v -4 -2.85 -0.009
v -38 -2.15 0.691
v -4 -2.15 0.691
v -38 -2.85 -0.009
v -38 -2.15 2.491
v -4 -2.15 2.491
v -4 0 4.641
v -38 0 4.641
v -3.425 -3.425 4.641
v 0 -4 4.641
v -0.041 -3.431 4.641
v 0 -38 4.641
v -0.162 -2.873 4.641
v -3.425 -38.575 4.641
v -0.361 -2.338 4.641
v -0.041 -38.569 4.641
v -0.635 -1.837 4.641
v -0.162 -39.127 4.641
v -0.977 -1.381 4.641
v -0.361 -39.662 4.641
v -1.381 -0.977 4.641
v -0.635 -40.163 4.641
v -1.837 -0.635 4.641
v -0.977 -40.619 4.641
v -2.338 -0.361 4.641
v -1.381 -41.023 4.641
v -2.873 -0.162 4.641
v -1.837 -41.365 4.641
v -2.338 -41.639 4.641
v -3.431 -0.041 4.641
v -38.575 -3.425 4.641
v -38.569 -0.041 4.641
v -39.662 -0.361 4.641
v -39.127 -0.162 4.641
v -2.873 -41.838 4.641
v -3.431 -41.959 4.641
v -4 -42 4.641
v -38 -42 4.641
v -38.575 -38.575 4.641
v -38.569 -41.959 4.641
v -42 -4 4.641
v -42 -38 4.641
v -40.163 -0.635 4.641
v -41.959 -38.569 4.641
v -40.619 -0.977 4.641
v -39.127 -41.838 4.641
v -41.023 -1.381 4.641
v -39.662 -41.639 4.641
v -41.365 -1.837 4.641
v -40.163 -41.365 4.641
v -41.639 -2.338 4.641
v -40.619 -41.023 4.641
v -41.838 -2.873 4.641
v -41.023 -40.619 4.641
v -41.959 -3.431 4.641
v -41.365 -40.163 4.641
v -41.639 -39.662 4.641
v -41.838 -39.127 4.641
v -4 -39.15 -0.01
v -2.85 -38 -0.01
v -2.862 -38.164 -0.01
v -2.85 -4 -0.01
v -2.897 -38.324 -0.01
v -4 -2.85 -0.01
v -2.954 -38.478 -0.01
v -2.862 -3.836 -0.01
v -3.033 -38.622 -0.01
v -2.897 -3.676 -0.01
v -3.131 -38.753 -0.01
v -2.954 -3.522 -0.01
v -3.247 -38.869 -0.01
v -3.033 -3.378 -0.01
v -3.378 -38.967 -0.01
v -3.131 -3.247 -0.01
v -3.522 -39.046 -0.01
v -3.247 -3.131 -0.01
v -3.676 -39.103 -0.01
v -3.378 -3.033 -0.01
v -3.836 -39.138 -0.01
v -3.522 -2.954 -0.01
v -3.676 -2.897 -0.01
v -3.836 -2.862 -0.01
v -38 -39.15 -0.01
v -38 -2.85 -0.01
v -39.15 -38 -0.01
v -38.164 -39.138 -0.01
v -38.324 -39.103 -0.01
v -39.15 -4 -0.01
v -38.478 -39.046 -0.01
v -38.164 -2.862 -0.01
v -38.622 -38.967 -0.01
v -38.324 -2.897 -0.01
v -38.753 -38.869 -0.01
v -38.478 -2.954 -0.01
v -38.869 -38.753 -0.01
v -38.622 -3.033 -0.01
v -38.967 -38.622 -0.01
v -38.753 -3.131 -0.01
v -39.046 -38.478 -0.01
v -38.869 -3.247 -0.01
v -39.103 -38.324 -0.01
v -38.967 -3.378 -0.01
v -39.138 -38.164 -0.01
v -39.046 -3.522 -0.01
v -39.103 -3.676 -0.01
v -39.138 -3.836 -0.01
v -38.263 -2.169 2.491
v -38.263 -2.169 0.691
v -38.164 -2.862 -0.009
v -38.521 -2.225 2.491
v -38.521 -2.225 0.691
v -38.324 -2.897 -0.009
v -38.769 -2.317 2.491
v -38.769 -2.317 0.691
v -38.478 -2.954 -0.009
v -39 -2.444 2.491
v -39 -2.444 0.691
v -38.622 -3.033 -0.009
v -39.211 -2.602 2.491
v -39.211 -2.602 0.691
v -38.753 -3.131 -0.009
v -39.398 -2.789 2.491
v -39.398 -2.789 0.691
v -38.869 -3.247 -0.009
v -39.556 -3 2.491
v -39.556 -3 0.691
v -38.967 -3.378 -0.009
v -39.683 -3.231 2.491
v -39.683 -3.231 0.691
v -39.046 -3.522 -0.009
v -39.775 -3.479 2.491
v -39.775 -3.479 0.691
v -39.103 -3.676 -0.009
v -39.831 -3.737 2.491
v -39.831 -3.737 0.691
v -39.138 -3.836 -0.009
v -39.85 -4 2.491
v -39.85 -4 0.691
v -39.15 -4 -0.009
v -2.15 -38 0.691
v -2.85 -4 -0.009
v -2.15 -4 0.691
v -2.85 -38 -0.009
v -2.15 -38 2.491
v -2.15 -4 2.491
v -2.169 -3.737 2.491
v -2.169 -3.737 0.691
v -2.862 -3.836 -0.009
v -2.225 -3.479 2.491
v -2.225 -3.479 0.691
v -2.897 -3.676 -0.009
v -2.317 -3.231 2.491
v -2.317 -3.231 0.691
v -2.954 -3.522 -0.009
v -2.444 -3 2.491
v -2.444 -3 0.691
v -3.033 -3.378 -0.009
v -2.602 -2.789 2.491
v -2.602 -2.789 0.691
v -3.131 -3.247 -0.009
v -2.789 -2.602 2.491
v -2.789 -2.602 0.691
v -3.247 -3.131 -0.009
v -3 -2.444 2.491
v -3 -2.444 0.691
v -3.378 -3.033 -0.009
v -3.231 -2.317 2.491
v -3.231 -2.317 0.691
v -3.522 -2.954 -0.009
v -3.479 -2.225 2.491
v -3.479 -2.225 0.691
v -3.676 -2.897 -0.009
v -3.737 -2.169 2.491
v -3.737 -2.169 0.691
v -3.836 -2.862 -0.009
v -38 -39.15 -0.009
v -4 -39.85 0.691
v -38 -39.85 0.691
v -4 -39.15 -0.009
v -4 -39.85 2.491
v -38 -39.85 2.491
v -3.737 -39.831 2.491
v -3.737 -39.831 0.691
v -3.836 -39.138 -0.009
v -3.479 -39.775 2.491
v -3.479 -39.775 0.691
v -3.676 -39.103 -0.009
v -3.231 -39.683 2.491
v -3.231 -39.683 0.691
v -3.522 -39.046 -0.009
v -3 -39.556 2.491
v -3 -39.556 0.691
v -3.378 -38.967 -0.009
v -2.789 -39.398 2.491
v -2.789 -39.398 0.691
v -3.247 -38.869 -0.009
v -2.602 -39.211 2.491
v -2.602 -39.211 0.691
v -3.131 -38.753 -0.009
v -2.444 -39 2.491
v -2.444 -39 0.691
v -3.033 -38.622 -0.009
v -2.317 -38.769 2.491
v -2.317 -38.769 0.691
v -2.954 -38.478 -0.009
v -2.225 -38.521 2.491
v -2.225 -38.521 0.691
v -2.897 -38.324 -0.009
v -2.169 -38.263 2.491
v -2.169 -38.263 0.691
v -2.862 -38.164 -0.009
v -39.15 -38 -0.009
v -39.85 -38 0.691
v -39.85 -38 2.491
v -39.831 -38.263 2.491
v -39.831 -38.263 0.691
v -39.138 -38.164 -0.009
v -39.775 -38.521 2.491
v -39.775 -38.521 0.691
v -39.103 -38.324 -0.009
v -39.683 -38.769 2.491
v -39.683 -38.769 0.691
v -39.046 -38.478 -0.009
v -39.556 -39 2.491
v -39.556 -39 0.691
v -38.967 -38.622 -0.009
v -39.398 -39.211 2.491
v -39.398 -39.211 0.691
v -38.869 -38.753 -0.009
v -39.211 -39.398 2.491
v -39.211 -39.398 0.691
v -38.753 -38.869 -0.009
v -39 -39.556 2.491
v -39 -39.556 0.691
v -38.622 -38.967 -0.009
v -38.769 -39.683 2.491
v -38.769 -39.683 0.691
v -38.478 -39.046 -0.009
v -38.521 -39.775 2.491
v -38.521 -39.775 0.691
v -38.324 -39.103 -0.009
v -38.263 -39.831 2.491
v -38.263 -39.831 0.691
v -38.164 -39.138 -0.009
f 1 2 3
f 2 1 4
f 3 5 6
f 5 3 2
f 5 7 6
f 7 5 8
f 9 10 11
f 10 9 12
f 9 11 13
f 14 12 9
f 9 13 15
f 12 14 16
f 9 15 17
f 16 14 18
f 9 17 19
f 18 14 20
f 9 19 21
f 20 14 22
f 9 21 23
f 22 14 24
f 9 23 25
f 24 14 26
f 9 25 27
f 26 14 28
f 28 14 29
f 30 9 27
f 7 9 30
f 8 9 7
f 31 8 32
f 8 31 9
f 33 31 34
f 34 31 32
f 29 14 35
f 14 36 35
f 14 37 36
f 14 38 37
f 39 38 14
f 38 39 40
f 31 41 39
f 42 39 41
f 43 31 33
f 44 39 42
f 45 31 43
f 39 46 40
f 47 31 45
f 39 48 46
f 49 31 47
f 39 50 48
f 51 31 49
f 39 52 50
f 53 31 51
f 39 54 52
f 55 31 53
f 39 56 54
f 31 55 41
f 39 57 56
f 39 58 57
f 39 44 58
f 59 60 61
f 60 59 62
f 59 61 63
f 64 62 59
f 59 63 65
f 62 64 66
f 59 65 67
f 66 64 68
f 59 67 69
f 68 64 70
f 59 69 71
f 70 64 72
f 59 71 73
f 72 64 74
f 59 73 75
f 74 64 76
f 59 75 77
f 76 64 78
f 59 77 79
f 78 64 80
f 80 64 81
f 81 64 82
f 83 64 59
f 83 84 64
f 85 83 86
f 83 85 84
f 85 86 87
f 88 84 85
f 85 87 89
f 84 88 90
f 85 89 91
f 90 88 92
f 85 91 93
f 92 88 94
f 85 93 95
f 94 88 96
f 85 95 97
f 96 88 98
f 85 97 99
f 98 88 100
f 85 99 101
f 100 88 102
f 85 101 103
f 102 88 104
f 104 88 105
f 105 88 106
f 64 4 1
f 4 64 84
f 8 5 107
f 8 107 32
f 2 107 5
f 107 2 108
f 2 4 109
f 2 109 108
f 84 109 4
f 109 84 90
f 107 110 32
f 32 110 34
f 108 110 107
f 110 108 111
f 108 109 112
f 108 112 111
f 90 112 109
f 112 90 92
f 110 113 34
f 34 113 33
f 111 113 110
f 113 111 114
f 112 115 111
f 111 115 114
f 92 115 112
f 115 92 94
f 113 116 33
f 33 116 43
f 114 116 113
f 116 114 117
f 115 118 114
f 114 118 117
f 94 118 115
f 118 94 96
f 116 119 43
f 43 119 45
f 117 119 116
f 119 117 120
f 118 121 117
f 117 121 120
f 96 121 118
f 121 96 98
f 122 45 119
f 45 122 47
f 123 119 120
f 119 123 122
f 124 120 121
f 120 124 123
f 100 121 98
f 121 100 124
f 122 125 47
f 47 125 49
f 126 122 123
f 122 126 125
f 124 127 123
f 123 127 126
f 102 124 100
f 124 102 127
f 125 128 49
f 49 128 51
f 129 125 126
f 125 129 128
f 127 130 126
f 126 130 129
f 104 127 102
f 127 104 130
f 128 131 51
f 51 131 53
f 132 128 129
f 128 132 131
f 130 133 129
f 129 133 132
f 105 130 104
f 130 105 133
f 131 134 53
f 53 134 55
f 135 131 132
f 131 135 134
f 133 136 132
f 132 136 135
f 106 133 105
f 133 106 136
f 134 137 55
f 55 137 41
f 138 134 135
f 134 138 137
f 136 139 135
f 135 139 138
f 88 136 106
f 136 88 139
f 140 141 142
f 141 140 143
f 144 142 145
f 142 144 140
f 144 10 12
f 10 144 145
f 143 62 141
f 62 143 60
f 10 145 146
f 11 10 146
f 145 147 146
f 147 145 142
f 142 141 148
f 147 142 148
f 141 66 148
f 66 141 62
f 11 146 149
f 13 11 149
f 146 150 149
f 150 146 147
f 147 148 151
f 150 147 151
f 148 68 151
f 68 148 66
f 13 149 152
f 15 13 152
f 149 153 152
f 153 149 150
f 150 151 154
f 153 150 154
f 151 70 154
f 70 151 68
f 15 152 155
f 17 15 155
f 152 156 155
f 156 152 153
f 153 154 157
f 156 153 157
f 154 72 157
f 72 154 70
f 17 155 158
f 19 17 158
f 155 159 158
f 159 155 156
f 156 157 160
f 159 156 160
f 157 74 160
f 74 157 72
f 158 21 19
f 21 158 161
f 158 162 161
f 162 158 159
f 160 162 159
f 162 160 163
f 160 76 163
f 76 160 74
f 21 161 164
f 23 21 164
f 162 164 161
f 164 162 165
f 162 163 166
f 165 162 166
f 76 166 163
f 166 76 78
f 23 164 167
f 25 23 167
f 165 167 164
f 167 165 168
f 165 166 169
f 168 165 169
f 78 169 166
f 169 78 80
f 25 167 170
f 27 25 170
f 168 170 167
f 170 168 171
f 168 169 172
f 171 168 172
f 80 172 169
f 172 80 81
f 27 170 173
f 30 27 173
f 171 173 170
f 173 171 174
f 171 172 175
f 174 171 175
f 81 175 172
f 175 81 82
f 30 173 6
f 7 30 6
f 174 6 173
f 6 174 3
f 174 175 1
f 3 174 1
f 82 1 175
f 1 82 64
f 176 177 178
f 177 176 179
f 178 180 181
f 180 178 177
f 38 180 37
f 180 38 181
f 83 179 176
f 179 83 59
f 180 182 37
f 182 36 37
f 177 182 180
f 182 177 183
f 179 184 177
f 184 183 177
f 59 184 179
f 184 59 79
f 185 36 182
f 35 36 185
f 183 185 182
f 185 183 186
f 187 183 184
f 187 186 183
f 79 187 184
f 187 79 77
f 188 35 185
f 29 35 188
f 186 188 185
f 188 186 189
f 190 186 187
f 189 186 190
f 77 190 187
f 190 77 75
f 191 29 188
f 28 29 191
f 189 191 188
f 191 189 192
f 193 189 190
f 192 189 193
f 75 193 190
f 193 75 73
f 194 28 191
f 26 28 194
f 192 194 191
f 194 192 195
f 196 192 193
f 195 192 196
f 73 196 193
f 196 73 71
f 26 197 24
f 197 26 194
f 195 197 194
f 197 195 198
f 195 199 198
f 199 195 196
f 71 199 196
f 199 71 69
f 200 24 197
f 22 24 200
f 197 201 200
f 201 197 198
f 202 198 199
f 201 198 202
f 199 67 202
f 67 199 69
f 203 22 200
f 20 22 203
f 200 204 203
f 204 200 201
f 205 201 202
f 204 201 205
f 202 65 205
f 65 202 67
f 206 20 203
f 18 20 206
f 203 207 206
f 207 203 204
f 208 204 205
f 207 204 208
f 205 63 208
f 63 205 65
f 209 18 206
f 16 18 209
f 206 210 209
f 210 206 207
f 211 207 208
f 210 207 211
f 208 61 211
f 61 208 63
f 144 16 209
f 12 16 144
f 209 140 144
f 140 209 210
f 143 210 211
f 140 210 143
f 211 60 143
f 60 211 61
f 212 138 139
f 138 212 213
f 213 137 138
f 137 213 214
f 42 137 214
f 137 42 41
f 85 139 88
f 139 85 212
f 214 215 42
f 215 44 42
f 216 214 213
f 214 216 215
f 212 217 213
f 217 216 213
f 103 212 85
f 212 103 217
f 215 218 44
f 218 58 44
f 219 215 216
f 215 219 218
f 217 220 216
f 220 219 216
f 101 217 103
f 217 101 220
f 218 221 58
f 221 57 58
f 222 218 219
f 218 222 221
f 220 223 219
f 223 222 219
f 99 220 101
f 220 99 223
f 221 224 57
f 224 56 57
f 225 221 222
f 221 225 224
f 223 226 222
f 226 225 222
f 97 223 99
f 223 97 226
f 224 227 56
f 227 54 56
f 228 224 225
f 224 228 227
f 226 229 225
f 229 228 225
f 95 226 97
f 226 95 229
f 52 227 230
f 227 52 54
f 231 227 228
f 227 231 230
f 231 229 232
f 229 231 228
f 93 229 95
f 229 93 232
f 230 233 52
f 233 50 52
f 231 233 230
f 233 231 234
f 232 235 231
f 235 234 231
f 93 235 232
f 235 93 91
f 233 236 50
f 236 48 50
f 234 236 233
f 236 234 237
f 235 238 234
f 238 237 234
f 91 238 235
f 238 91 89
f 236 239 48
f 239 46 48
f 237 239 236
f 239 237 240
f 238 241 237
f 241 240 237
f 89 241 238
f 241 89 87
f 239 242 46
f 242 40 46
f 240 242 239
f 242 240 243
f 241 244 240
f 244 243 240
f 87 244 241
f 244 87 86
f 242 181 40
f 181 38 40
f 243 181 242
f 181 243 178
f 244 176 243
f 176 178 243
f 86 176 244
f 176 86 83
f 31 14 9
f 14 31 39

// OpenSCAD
// ===== INFORMATION ===== //
/*
 IMPORTANT: rendering will be better in development builds and not the official release of OpenSCAD, but it makes rendering only take a couple seconds, even for comically large bins.

https://github.com/kennetek/gridfinity-rebuilt-openscad

STANDALONE VERSION - All dependencies inlined
*/

// ===== INLINED DEPENDENCIES ===== //

// ==== BEGIN: src/core/standard.scad ====

// minimum wall thickness
d_wall = 0.95;

// internal fillet radius
r_f2 = 2.8;

// width of divider between compartments
d_div = 1.2;

/**
 * @brief Size of a single gridfinity unit. [Length, Width] In millimeters.
 */
GRID_DIMENSIONS_MM = [42, 42];

// Tollerance to make sure cuts don't leave a sliver behind,
// and that items are properly connected to each other.
TOLLERANCE = 0.02;

// ****************************************
// Magnet / Screw Hole Constants
// ****************************************
LAYER_HEIGHT = 0.2;
MAGNET_HEIGHT = 2;

SCREW_HOLE_RADIUS = 3 / 2;
MAGNET_HOLE_RADIUS = 6.5 / 2;
MAGNET_HOLE_DEPTH = MAGNET_HEIGHT + (LAYER_HEIGHT * 2);

// distance of hole from side of bin
d_hole_from_side=8;

// Based on https://gridfinity.xyz/specification/
HOLE_DISTANCE_FROM_BOTTOM_EDGE = 4.8;

// Meassured diameter in Fusion360.
// Smaller than the magnet to keep it squeezed.
REFINED_HOLE_RADIUS = 5.86 / 2;
REFINED_HOLE_HEIGHT = MAGNET_HEIGHT - 0.1;
// How many layers are between a Gridfinity Refined Hole and the bottom
REFINED_HOLE_BOTTOM_LAYERS = 2;

// Experimentally chosen for a press fit.
MAGNET_HOLE_CRUSH_RIB_INNER_RADIUS = 5.9 / 2;
// Mostly arbitrarily chosen.
// 30 ribs does not print with a 0.4mm nozzle.
// Anything 5 or under produces a hole that is not round.
MAGNET_HOLE_CRUSH_RIB_COUNT = 8;

// Radius to add when chamfering magnet and screw holes.
CHAMFER_ADDITIONAL_RADIUS = 0.8;
CHAMFER_ANGLE = 45;

// When countersinking the baseplate, how much to add to the screw radius.
BASEPLATE_SCREW_COUNTERSINK_ADDITIONAL_RADIUS = 5/2;
BASEPLATE_SCREW_COUNTERBORE_RADIUS = 5.5/2;
BASEPLATE_SCREW_COUNTERBORE_HEIGHT = 3;

// ****************************************
// Tab Constants
// Arbitrarily chosen.
// ****************************************

/**
 * @brief Maximum width of a tab.
 */
TAB_WIDTH_NOMINAL = 42;

 /**
 * @brief How deep the tab protrudes into the bin.
 * @details External code should use `TAB_SIZE.x` instead.
 */
_tab_depth = 15.85;

/**
 * @brief Angle of the support holding up the tab
 */
 _tab_support_angle = 36;

 /**
 * @brief Additional support height, so the end isn't a sharp angle.
 */
 _tab_support_height = 1.2;

_tab_height = tan(_tab_support_angle) * _tab_depth + _tab_support_height;
TAB_POLYGON = [
    [0, 0], // Start
    [0, _tab_height], // Up
    [_tab_depth, _tab_height], //Out
    [_tab_depth, _tab_height - _tab_support_height] // Prevent a sharp angle
    //Implicit back to start
];

/**
 * @brief Size of the tab.
 * @Details "x": How deep the tab protrudes into the bin.
 *          "y": The height of the tab.
 */
TAB_SIZE = TAB_POLYGON[2];

// ****************************************
// Stacking Lip Constants
// Based on https://gridfinity.xyz/specification/
// Also includes a support base.
// ****************************************

/**
 * @Summary Fillet so the stacking lip does not come to a sharp point.
 */
STACKING_LIP_FILLET_RADIUS = 0.6;

/**
 * @Summary Height of the innermost section. In mm.
 * @Details Used to keep the innermost lip from just being a triangle.
 *          Spec implicitly expects wall width to equal stacking lip depth, so does not define this.
 */
STACKING_LIP_SUPPORT_HEIGHT = 1.2;

/**
 * @Summary Stacking lip as defined in the spec.  No support.
 * @Details This is just a line, and will not create a solid polygon.
 */
STACKING_LIP_LINE = [
    [0, 0], // Inner tip
    [0.7, 0.7], // Go out 45 degrees
    [0.7, (0.7+1.8)], // Vertical increase
    [(0.7+1.9), (0.7+1.8+1.9)], // Go out 45 degrees
];

/**
 * @Summary Size of the stacking lip.
 * @Details "x": How deep the stacking lip protrudes into the bin.
 *               Including wall thickness.
 *          "y": The height of the stacking lip.
 * @WARNING: Height does NOT include STACKING_LIP_SUPPORT_HEIGHT.
 */
STACKING_LIP_SIZE = STACKING_LIP_LINE[3];

/**
 * @brief Height of the stacking lip.
 * @details Height does **not** include STACKING_LIP_SUPPORT_HEIGHT.
 */
STACKING_LIP_HEIGHT = STACKING_LIP_SIZE.y;

_stacking_lip_support_angle = 45;

/**
 * @Summary Calculated value for the overall height of the stacking lip.
 *          Including support.
 */
_stacking_lip_support_height_mm =
    STACKING_LIP_SUPPORT_HEIGHT
    + tan(90 - _stacking_lip_support_angle) * STACKING_LIP_SIZE.x;

/**
 * @Summary Stacking lip with a support. Used to create a polygon.
 * @Details Support is so the stacking lip is not floating in mid air when wall width is less than stacking lip depth.
 */
STACKING_LIP = concat(STACKING_LIP_LINE, [
    [STACKING_LIP_SIZE.x-TOLLERANCE, -_stacking_lip_support_height_mm], // Down to support bottom
    [0, -STACKING_LIP_SUPPORT_HEIGHT], // Up and in (to bottom inner support)
    //[0, 0] // Implicit back to start
]);

// ****************************************
// Base constants
// Based on https://gridfinity.xyz/specification/
// ****************************************

/**
 * @Summary Profile of a Gridfinity base as described in the spec.
 * @Details This is just a line, and will not create a solid polygon.
 */
BASE_PROFILE = [
    [0, 0], // Innermost bottom point
    [0.8, 0.8], // Up and out at a 45 degree angle
    [0.8, (0.8+1.8)], // Straight up
    [(0.8+2.15), (0.8+1.8+2.15)] // Up and out at a 45 degree angle
];

/**
 * @brief Maximum [x, y] values/size of the base.
 */
_base_profile_max_mm= BASE_PROFILE[3];

/**
 * @Summary Corner radius of the top of the base.
 */
BASE_TOP_RADIUS = 7.5 / 2;

/**
 * @Summary Size of the top of the base. [Length, Width]
 * @Details Each unit's base is 41.5mm x 41.5mm
 *          Leaving 0.5mm gap with an l_grid of 42
 */
BASE_TOP_DIMENSIONS = [41.5, 41.5];

/**
 * @Summary How much overhang is expected by the standard per base.
 * @Details There should be a 0.5mm gap between each base.
 *          This must be kept constant, even at half/quarter grid sizes.
 *          Otherwise, they won't fit in normal grids.
 */
BASE_GAP_MM = GRID_DIMENSIONS_MM - BASE_TOP_DIMENSIONS;

/**
 * @brief Height of the base profile.
 * @details Does **not** include the structure tying the bases together.
 */
BASE_PROFILE_HEIGHT = _base_profile_max_mm.y;

/**
 * @Summary Height of the base.
 * @details Includes the structure tying the bases together.
 */
BASE_HEIGHT = 7;

/**
 * @Summary Height of the structure tying the bases together.
 */
BASE_BRIDGE_HEIGHT = BASE_HEIGHT - BASE_PROFILE_HEIGHT;

/**
 * @Summary Corner radius of the bottom of the base.
 * @Details This is also how much BASE_PROFILE needs to be translated
 *          to use `sweep_rounded(...)`.
 */
BASE_BOTTOM_RADIUS = BASE_TOP_RADIUS - _base_profile_max_mm.x;

/**
 * @Summary Dimensions of the bottom of the base. [Length, Width]
 * @Details Supports arbitrary top sizes.
 * @param top_dimensions [Length, Width] of the top of the base.
 */
function base_bottom_dimensions(top_dimensions = BASE_TOP_DIMENSIONS) =
    assert(is_list(top_dimensions) && len(top_dimensions) == 2
        && is_num(top_dimensions.x) && is_num(top_dimensions.y))
    top_dimensions
    - 2*[_base_profile_max_mm.x, _base_profile_max_mm.x];

// ***************
// Gridfinity Refined Thumbscrew
// See https://www.printables.com/model/413761-gridfinity-refined
// ***************

BASE_THUMBSCREW_OUTER_DIAMETER=15;
BASE_THUMBSCREW_PITCH=1.5;


// ****************************************
// Weighted Baseplate
// ****************************************

// Baseplate bottom part height (part added with weigthed=true)
bp_h_bot = 6.4;
// Baseplate bottom cutout rectangle size
bp_cut_size = 21.4;
// Baseplate bottom cutout rectangle depth
bp_cut_depth = 4;
// Baseplate bottom cutout rounded thingy width
bp_rcut_width = 8.5;
// Baseplate bottom cutout rounded thingy left
bp_rcut_length = 4.25;
// Baseplate bottom cutout rounded thingy depth
bp_rcut_depth = 2;

// ****************************************

// radius of cutout for skeletonized baseplate
r_skel = 2;
// minimum baseplate thickness (when skeletonized)
h_skel = 1;


// ****************************************
// Deprecated Values
// Will be removed / re-named in the future.
// ****************************************

// height of tab (yaxis, measured from inner wall)
d_tabh = _tab_depth;

// angle of tab
a_tab = _tab_support_angle;

/**
 * @deprecated Use GRID_DIMENSIONS_MM instead.
 */
l_grid = GRID_DIMENSIONS_MM.x;

// ==== END: src/core/standard.scad ====

// ==== BEGIN: helper functions (angles, generic-helpers, shapes) ====

/**
 * @brief `sign` function, but 0 means a positive sign.
 * @description This is useful for applying signs to trig functions.
 * @returns -1 or 1.
 */
function signp(number) =
    assert(is_num(number))
    let(n = sign(number))
    n == 0 ? 1 : n;

/*
 * @brief Convert an angle to between -180 and +180 degrees.
 */
function normalize_angle(angle) =
    assert(is_num(angle))
    let(a = angle%360)
    a > 180 ? a - 360 :
    a < -180 ? a + 360 : a;

/*
 * @brief Convert an angle to between 0 and +360 degrees.
 */
function positive_angle(angle) =
    assert(is_num(angle))
    let(a = angle%360)
    a < 0 ? (a + 360) % 360 : a;

/**
 * @brief Determines the number of fragments in a circle. Aka, Circle resolution.
 * @param r Radius of the circle.
 * @details Recommended function from the manual as a translation of the OpenSCAD function.
 *          Used to improve performance by not rendering every single degree of circles/spheres.
 * @see https://en.wikibooks.org/wiki/OpenSCAD_User_Manual/Other_Language_Features#Circle_resolution:_$fa,_$fs,_and_$fn
 */
function get_fragments_from_r(r) =
    assert(r > 0)
    ($fn>0?($fn>=3?$fn:3):ceil(max(min(360/$fa,r*2*PI/$fs),5)));

function clp(x,a,b) = min(max(x,a),b);
function is_even(number) = (number%2)==0;

module copy_mirror(vec=[0,1,0]) {
    children();
    if (vec != [0,0,0])
    mirror(vec)
    children();
}

module pattern_circular(n=2) {
    for (i = [1:n])
    rotate(i*360/n)
    children();
}

/**
 * @brief Unity (no change) affine transformation matrix.
 * @details For use with multmatrix transforms.
 */
unity_matrix = [
    [1, 0, 0, 0],
    [0, 1, 0, 0],
    [0, 0, 1, 0],
    [0, 0, 0, 1]
];

/**
 * @brief Convert a vector into a unit vector.
 * @returns The unit vector.  Where total magnitude is 1.
 */
function vector_as_unit(vector) = vector / norm(vector);

function _affine_rotate_x(angle_x) = [
    [1,  0, 0, 0],
    [0, cos(angle_x), -sin(angle_x), 0],
    [0, sin(angle_x), cos(angle_x), 0],
    [0, 0, 0, 1]
];

function _affine_rotate_y(angle_y) = [
    [cos(angle_y),  0, sin(angle_y), 0],
    [0, 1, 0, 0],
    [-sin(angle_y), 0, cos(angle_y), 0],
    [0, 0, 0, 1]
];

function _affine_rotate_z(angle_z) = [
    [cos(angle_z), -sin(angle_z), 0, 0],
    [sin(angle_z), cos(angle_z), 0, 0],
    [0, 0, 1, 0],
    [0, 0, 0, 1]
];

/**
 * @brief Affine transformation matrix equivalent of `rotate`
 * @param angle_vector @see `rotate`
 * @details Equivalent to `rotate([0, angle, 0])`
 * @returns An affine transformation matrix for use with `multmatrix()`
 */
function affine_rotate(angle_vector) =
    _affine_rotate_z(angle_vector.z) *
    _affine_rotate_y(angle_vector.y) *
    _affine_rotate_x(angle_vector.x);

/**
 * @brief Affine transformation matrix equivalent of `translate`
 * @param vector @see `translate`
 * @returns An affine transformation matrix for use with `multmatrix()`
 */
function affine_translate(vector) = [
    [1, 0, 0, vector.x],
    [0, 1, 0, vector.y],
    [0, 0, 1, vector.z],
    [0, 0, 0, 1]
];

/**
 * @brief Affine transformation matrix equivalent of `scale`
 * @param vector @see `scale`
 * @returns An affine transformation matrix for use with `multmatrix()`
 */
function affine_scale(vector) = [
    [vector.x, 0, 0, 0],
    [0, vector.y, 0, 0],
    [0, 0, vector.z, 0],
    [0, 0, 0, 1]
];

/**
 * @brief Add something to each element in a list.
 * @param list The list whos elements will be modified.
 * @param to_add
 * @returns A list with `to_add` added to each element in the list.
 */
function foreach_add(list, to_add) =
    assert(is_list(list))
    assert(!is_undef(to_add))
    [for (item = list) item + to_add];

/**
 * @brief Scale each element in a vector by the corresponding element in another vector.
 * @param vector1
 * @param vector2
 * @returns The equivalent of `[vector1.x * vector2.x, vector1.y * vector2.y]`
 */
function vector_scale(vector1, vector2) = assert(len(vector1) == len(vector2))
    [for(i=[0:len(vector1)-1]) vector1[i] * vector2[i] ];


/*
 * @brief If the given vector is a valid 2d vector.
 * @details Only validates the first two elements.
 *          The list could have other things after those.
 */
function is_valid_2d(vector) =
    is_list(vector)
    && len(vector) >= 2
    && is_num(vector[0])
    && is_num(vector[1]);

/*
 * @brief If the given vector is a valid 3d vector.
 * @details This just validates the first three elements.
 *          The list could have other things after those.
 */
function is_valid_3d(vector) =
    is_valid_2d(vector)
    && len(vector) >= 3
    && is_num(vector[2]);

/*
 * @brief If all the elements in a vector are greater than zero.
 */
function is_positive(vector) =
    is_list(vector)
    && min(vector) > 0;

/**
 * @breif Simple helper to print affine matrices in an easier to read manner.
 * @details If a multidimensional matrix is provided, then each item is printed to a separate line.
 * @param object Object to print.
 */
module pprint(object) {
    if(is_list(object) && len(object) != len([for(i=object)each i])) {
        echo("[");
        for(i = object) {
            echo(i);
        };
        echo("]");
    } else {
        echo(object);
    }
}

/**
 * @brief Create a rectangle with rounded corners by sweeping a 2d object along a path.
 * @Details Centered on origin.
 *          Result is on the X,Y plane.
 *          Expects children to be a 2D shape in Quardrant 1 of the X,Y plane.
 * @param size Dimensions of the resulting object.
 *             Either a single number or [width, length]
 */
module sweep_rounded(size) {
    assert((is_num(size) && size > 0) || (
        is_list(size) && len(size) == 2 &&
        is_num(size.x) && size.x > 0 && is_num(size.y) && size.y > 0
        )
    );

    width = is_num(size) ? size : size.x;
    length = is_num(size) ? size : size.y;
    half_width = width/2;
    half_length = length/2;
    path_points = [
        [-half_width, half_length],  //Start
        [half_width, half_length], // Over
        [half_width, -half_length], //Down
        [-half_width, -half_length], // Back over
        [-half_width, half_length]  // Up to start
    ];
    path_vectors = [
        path_points[1] - path_points[0],
        path_points[2] - path_points[1],
        path_points[3] - path_points[2],
        path_points[4] - path_points[3],
    ];
    // These contain the translations, but not the rotations
    // OpenSCAD requires this hacky for loop to get accumulate to work!
    first_translation = affine_translate([path_points[0].y, 0,path_points[0].x]);
    affine_translations = concat([first_translation], [
        for (i = 0, a = first_translation;
            i < len(path_vectors);
            a=a * affine_translate([path_vectors[i].y, 0, path_vectors[i].x]), i=i+1)
        a * affine_translate([path_vectors[i].y, 0, path_vectors[i].x])
    ]);

    // Bring extrusion to the xy plane
    affine_matrix = affine_rotate([90, 0, 90]);

    walls = [
        for (i = [0 : len(path_vectors) - 1])
        affine_matrix * affine_translations[i]
        * affine_rotate([0, atan2(path_vectors[i].y, path_vectors[i].x), 0])
    ];

    union()
    {
        for (i = [0 : len(walls) - 1]){
            multmatrix(walls[i])
            linear_extrude(norm(path_vectors[i]))
            children();

            // Rounded Corners
            multmatrix(walls[i] * affine_rotate([-90, 0, 0]))
            rotate_extrude(angle = 90, convexity = 4)
            children();
        }
    }
}

// ==== Shapes modules ====

/**
 * @brief Create a cone given a radius and an angle.
 * @param bottom_radius Radius of the bottom of the cone.
 * @param angle Angle as measured from the bottom of the cone.
 * @param max_height Optional maximum height.  Cone will be cut off if higher.
 */
module cone(bottom_radius, angle, max_height=0) {
    assert(bottom_radius > 0);
    assert(angle > 0 && angle <= 90);
    assert(max_height >=0);

    height = tan(angle) * bottom_radius;
    if(max_height == 0 || height < max_height) {
        // Normal Cone
        cylinder(h = height, r1 = bottom_radius, r2 = 0, center = false);
    } else {
        top_angle = 90 - angle;
        top_radius = bottom_radius - tan(top_angle) * max_height;
        cylinder(h = max_height, r1 = bottom_radius, r2 = top_radius, center = false);
    }
}

/**
 * @brief Create `square`, with rounded corners.
 * @param size Same as `square`.
 * @param radius Radius of the corners. 0 is the same as just calling `square`
 * @param center Same as `square`.
 */
module rounded_square(size, radius, center = false) {
    assert(is_num(size) ||
        (is_list(size) && (
            (len(size) == 2 && is_num(size.x) && is_num(size.y))
        ))
    );
    assert(is_num(radius) && radius >= 0);
    assert(is_bool(center));

    // Make sure something is produced.
    if (is_num(size)) {
        assert((size/2) > radius);
    } else {
        assert((size.x/2) > radius && (size.y/2 > radius),
            str("Cannot create a rounded_square smaller than the corner radius (", radius,").")
        );
    }
    size_l = is_num(size) ? [size, size] : size;
    diameter_2d = 2 * [radius, radius];

    offset(radius)
    square(size_l - diameter_2d, center = center);
}

// ==== END: helper functions ====

// ===== PARAMETERS ===== //

/* [Setup Parameters] */
$fa = 8;
$fs = 0.25;

/* [General Settings] */
// number of bases along x-axis
gridx = 1;
// number of bases along y-axis
gridy = 1;

/* [Screw Together Settings - Defaults work for M3 and 4-40] */
// screw diameter
d_screw = 3.35;
// screw head diameter
d_screw_head = 5;
// screw spacing distance
screw_spacing = .5;
// number of screws per grid block
n_screws = 1; // [1:3]


/* [Fit to Drawer] */
// minimum length of baseplate along x (leave zero to ignore, will automatically fill area if gridx is zero)
distancex = 0;
// minimum length of baseplate along y (leave zero to ignore, will automatically fill area if gridy is zero)
distancey = 0;

// where to align extra space along x
fitx = 0; // [-1:0.1:1]
// where to align extra space along y
fity = 0; // [-1:0.1:1]


/* [Styles] */

// baseplate styles
style_plate = 0; // [0: thin, 1:weighted, 2:skeletonized, 3: screw together, 4: screw together minimal]


// hole styles
style_hole = 0; // [0:none, 1:countersink, 2:counterbore]

/* [Magnet Hole] */
// Baseplate will have holes for 6mm Diameter x 2mm high magnets.
enable_magnet = true;
// Magnet holes will have crush ribs to hold the magnet.
crush_ribs = true;
// Magnet holes will have a chamfer to ease insertion.
chamfer_holes = true;

// ==== BEGIN: Baseplate modules and hole modules ====

// ****************************************
// Baseplate constants
// Based on https://gridfinity.xyz/specification/
// ****************************************

/**
 * @Summary Length & Width of a single baseplate.
 */
BASEPLATE_DIMENSIONS = [42, 42];
BASEPLATE_DIMENSIONS_HALF = [21, 42];

/**
 * @Summary Minimum height of a baseplate.
 * @Details Ads clearance height to the polygon, and
 *          ensures the base makes contact with the baseplate lip.
 */
BASEPLATE_HEIGHT = 4.631;

/**
 * @Summary Corner diameter of the outside of the baseplate.
 */
BASEPLATE_OUTER_DIAMETER = 8;

/**
 * @Summary Profile of a Gridfinity baseplate as described in the spec.
 * @Details This is just a line, and will not create a solid polygon.
 *          Does NOT include the clearance height.
 */
_BASEPLATE_PROFILE = [
    [0, 0], // Innermost bottom point
    [0.7, 0.7], // Up and out at a 45 degree angle
    [0.7, (0.7+1.8)], // Straight up
    [(0.7+2.15), (0.7+1.8+2.15)], // Up and out at a 45 degree angle
];

// ****************************************
// Calculations
// ****************************************

/**
 * @Summary Corner radius of the outside of the baseplate.
 */
BASEPLATE_OUTER_RADIUS = BASEPLATE_OUTER_DIAMETER / 2;

///**
// * @Summary Corner radius of the inside of the baseplate.
// * @Details This is also how much _BASEPLATE_PROFILE needs to be translated
// *          to use `sweep_rounded(...)`.
// */
BASEPLATE_INNER_RADIUS = BASEPLATE_OUTER_RADIUS - _BASEPLATE_PROFILE[3].x;

/**
 * @Summary Corner diameter of the inside of the baseplate.
 */
BASEPLATE_INNER_DIAMETER = BASEPLATE_INNER_RADIUS * 2;

// ****************************************
// Implementation Functions
// ****************************************

/**
 * @Summary Polygon of the negative of a baseplate.
 * @Details Includes clearance height, as required by spec.
 *          Ready to use with to use `sweep_rounded(...)`.
 * @param height Height of the baseplate's hollow section.
                 Must be the same as or larger than BASEPLATE_HEIGHT.
 */
module _baseplate_cutter_polygon(height) {
    assert(height >= BASEPLATE_HEIGHT, "_baseplate_cutter_polygon: height may not be less than BASEPLATE_HEIGHT");
    // The minimum height between the baseplate lip and anything below it.
    // Needed to make sure the base always makes contact with the baseplate lip.
    _baseplate_clearance_height = height - _BASEPLATE_PROFILE[3].y;
    assert(_baseplate_clearance_height > 0, "Baseplate too short.");

    translated_line = foreach_add(_BASEPLATE_PROFILE,
        [BASEPLATE_INNER_RADIUS, _baseplate_clearance_height]);

    polygon(concat(translated_line, [
            [0, height],  // Go in to form a solid polygon
            [0, 0],  // Straight down
            [translated_line[0].x, 0] // Out to the translated start.
        ]));
}

/**
 * @Summary Inner size of the baseplate.
 * @param size [width, length] of a single baseplate.
 *             Only set if deviating from the standard!
 * @Details To be used with `rounded_square(...)` from generic-helpers.
 * @Example `rounded_square(baseplate_inner_size(), BASEPLATE_INNER_RADIUS, center=true);`
 */
function baseplate_inner_size(size=BASEPLATE_DIMENSIONS) = foreach_add(size, BASEPLATE_INNER_DIAMETER - BASEPLATE_OUTER_DIAMETER);

/**
 * @Summary The negative of a single baseplate.
 * @param size [width, length] of a single baseplate.
 *             Only set if deviating from the standard!
 * @param height Height of the baseplate's hollow section.
                 Must be the same as or larger than BASEPLATE_HEIGHT.
 * @Details Use with `difference()`.
 */
module baseplate_cutter(size=BASEPLATE_DIMENSIONS, height=BASEPLATE_HEIGHT) {
    //aaron add a 42 x 42 cube 5 high
        
    assert(
        is_list(size) &&
        len(size) == 2 &&
        size.x > BASEPLATE_OUTER_DIAMETER &&
        size.y > BASEPLATE_OUTER_DIAMETER,
        "baseplate_cutter: argument 'dimensions' less than BASEPLATE_OUTER_DIAMETER.");
    assert(height >= BASEPLATE_HEIGHT, "baseplate_cutter: height may not be less than BASEPLATE_HEIGHT");

    inner_dimensions = foreach_add(size, -BASEPLATE_OUTER_DIAMETER);

    //Cube's dimensions are set to ensure overlap with `sweep_rounded(...)`
    //without using `rounded_square(...)`.
    inner_size = baseplate_inner_size(size);
    cube_dimensions = [
            inner_size.x - BASEPLATE_INNER_RADIUS,
            inner_size.y - BASEPLATE_INNER_RADIUS,
            height
        ];
    union(){
        sweep_rounded(inner_dimensions){
            _baseplate_cutter_polygon(height);
        }

        translate([0, 0, height/2])
        cube(cube_dimensions, center = true);
    }
}

/**
 * @brief Wave generation function for wrapping a circle.
 * @param t An angle of the circle.  Between 0 and 360 degrees.
 * @param count The number of **full** waves in a 360 degree circle.
 * @param range **Half** the difference between minimum and maximum values.
 * @param vertical_offset Added to the output.
 *                        When wrapping a circle, radius of that circle.
 */
function wave_function(t, count, range, vertical_offset) =
    (sin(t * count) * range) + vertical_offset;

/**
 * @brief A circle with crush ribs to give a tighter press fit.
 * @details Extrude and use as a negative modifier.
 *          Idea based on Slant3D's video at 5:20 https://youtu.be/Bd7Yyn61XWQ?t=320
 *          Implementaiton is completely different.
 *          Important: Lower ribs numbers just result in a deformed circle.
 * @param outer_radius Final outer radius.
 * @param inner_radius Final inner radius.
 * @param ribs Number of crush ribs the circle has.
**/
module ribbed_circle(outer_radius, inner_radius, ribs) {
    assert(outer_radius > 0, "outer_radius must be positive");
    assert(inner_radius > 0, "inner_radius must be positive");
    assert(ribs > 0, "ribs must be positive");
    assert(outer_radius > inner_radius, "outer_radius must be larger than inner_radius");

    wave_range = (outer_radius - inner_radius) / 2;
    wave_vertical_offset = inner_radius + wave_range;
    fragments=get_fragments_from_r(wave_vertical_offset);
    degrees_per_fragment = 360/fragments;

    // Circe with a wave wrapped around it
    wrapped_circle = [ for (i = [0:degrees_per_fragment:360])
        [sin(i), cos(i)] * wave_function(i, ribs, wave_range, wave_vertical_offset)
    ];

    polygon(wrapped_circle);
}

/**
 * @brief A cylinder with crush ribs to give a tighter press fit.
 * @details To be used as the negative for a hole.
 * @see ribbed_circle
 * @param outer_radius Outer Radius of the crush ribs.
 * @param inner_radius Inner Radius of the crush ribs.
 * @param height Cylinder's height.
 * @param ribs Number of crush ribs.
 */
module ribbed_cylinder(outer_radius, inner_radius, height, ribs) {
    assert(height > 0, "height must be positive");
    linear_extrude(height)
    ribbed_circle(
        outer_radius,
        inner_radius,
        ribs
    );
}

/**
 * @brief Make a hole printable without suports.
 * @see https://www.youtube.com/watch?v=W8FbHTcB05w
 * @param inner_radius Radius of the inner hole.
 * @param outer_radius Radius of the outer hole.
 * @param outer_height Height of the outer hole.
 * @param layers Number of layers to make printable.
 * @details This is the negative designed to be cut out of the magnet hole.
 *          Use it with `difference()`.
 *          Special handling is done to support a single layer,
 *          and because the last layer (unless there is only one) has a different shape.
 */
module make_hole_printable(inner_radius, outer_radius, outer_height, layers=2) {
    assert(inner_radius > 0, "inner_radius must be positive");
    assert(outer_radius > 0, "outer_radius must be positive");
    assert(layers > 0);

    height_adjustment = outer_height - (layers * LAYER_HEIGHT);

    // Needed, since the last layer should not be used for calculations,
    // unless there is a single layer.
    calculation_layers = max(layers-1, 1);

    cube_height = LAYER_HEIGHT + 2*TOLLERANCE;
    inner_diameter = 2*(inner_radius+TOLLERANCE);
    outer_diameter = 2*(outer_radius+TOLLERANCE);
    per_layer_difference = (outer_diameter-inner_diameter) / calculation_layers;

    initial_matrix = affine_translate([0, 0, cube_height/2-TOLLERANCE + height_adjustment]);

    // Produces data in the form [affine_matrix, [cube_dimensions]]
    // If layers > 1, the last item produced has an invalid "affine_matrix.y", because it is beyond calculation_layers.
    // That is handled in a special case to avoid doing a check every loop.
    cutout_information = [
        for(i=0; i <= layers; i=i+1)
        [
            initial_matrix * affine_translate([0, 0, (i-1)*LAYER_HEIGHT]) *
                affine_rotate([0, 0, is_even(i) ? 90 : 0]),
            [outer_diameter-per_layer_difference*(i-1),
                outer_diameter-per_layer_difference*i,
                cube_height]
        ]
    ];

    difference() {
        translate([0, 0, layers*cube_height/2 + height_adjustment])
        cube([outer_diameter+TOLLERANCE, outer_diameter+TOLLERANCE, layers*cube_height], center = true);

        for (i = [1 : calculation_layers]){
            data = cutout_information[i];
            multmatrix(data[0])
            cube(data[1], center = true);
        }
        if(layers > 1) {
            data = cutout_information[len(cutout_information)-1];
            multmatrix(data[0])
            cube([data[1].x, data[1].x, data[1].z], center = true);
        }
    }
}

/**
* @brief Refined hole based on Printables @grizzie17's Gridfinity Refined
* @details Magnet is pushed in from +X direction, and held in by friction.
*          Small slit on the bottom allows removing the magnet.
* @see https://www.printables.com/model/413761-gridfinity-refined
*/
module refined_hole() {
    refined_offset = LAYER_HEIGHT * REFINED_HOLE_BOTTOM_LAYERS;

    // Poke through - For removing a magnet using a toothpick
    ptl = refined_offset + LAYER_HEIGHT; // Additional layer just in case
    poke_through_height = REFINED_HOLE_HEIGHT + ptl;
    poke_hole_radius = 2.5;
    magic_constant = 5.60;
    poke_hole_center = [-12.53 + magic_constant, 0, -ptl];

    translate([0, 0, refined_offset])
    union() {
        // Magnet hole
        translate([0, -REFINED_HOLE_RADIUS, 0])
        cube([11, REFINED_HOLE_RADIUS*2, REFINED_HOLE_HEIGHT]);
        cylinder(REFINED_HOLE_HEIGHT, r=REFINED_HOLE_RADIUS);

        // Poke hole
        translate([poke_hole_center.x, -poke_hole_radius/2, poke_hole_center.z])
        cube([10 - magic_constant, poke_hole_radius, poke_through_height]);
        translate(poke_hole_center)
        cylinder(poke_through_height, d=poke_hole_radius);
    }
}

/**
 * @brief Create a screw hole
 * @param radius Radius of the hole.
 * @param height Height of the hole.
 * @param supportless If the hole is designed to be printed without supports.
 * @param chamfer_radius If the hole should be chamfered, then how much should be added to radius.  0 means don't chamfer
 * @param chamfer_angle If the hole should be chamfered, then what angle should it be chamfered at.  Ignored if chamfer_radius is 0.
 */
module screw_hole(radius, height, supportless=false, chamfer_radius=0, chamfer_angle = 45) {
    assert(radius > 0);
    assert(height > 0);
    assert(chamfer_radius >= 0);

    union(){
        difference() {
            cylinder(h = height, r = radius);
            if (supportless) {
                rotate([0, 0, 90])
                make_hole_printable(0.5, radius, height, 3);
            }
        }
        if (chamfer_radius > 0) {
            cone(radius + chamfer_radius, chamfer_angle, height);
        }
    }
}

/**
 * @brief Create an options list used to configure bin holes.
 * @param refined_hole Use gridfinity refined hole type.  Not compatible with "magnet_hole".
 * @param magnet_hole Create a hole for a 6mm magnet.
 * @param screw_hole Create a hole for a M3 screw.
 * @param crush_ribs If the magnet hole should have crush ribs for a press fit.
 * @param chamfer Add a chamfer to the magnet/screw hole.
 * @param supportless If the magnet/screw hole should be printed in such a way that the screw hole does not require supports.
 */
function bundle_hole_options(refined_hole=false, magnet_hole=false, screw_hole=false, crush_ribs=false, chamfer=false, supportless=false) =
    assert(is_bool(refined_hole))
    assert(is_bool(magnet_hole))
    assert(is_bool(screw_hole))
    assert(is_bool(crush_ribs))
    assert(is_bool(chamfer))
    assert(is_bool(supportless))
    assert(!refined_hole
        || (refined_hole && !magnet_hole),
    "magnet_hole is not compatible with refined_hole")
    [
        "hole_options_struct",
        refined_hole,
        magnet_hole,
        screw_hole,
        crush_ribs,
        chamfer,
        supportless
    ];

/**
 * @brief If the object is a "hole_options".
 * @param hole_options The object to check.
 */
function is_hole_options(hole_options) =
    is_list(hole_options)
    && len(hole_options) == 7
    && hole_options[0] == "hole_options_struct";

/**
 * @brief A single magnet/screw hole.  To be cut out of the base.
 * @details Supports multiple options that can be mixed and matched.
 * @pram hole_options @see bundle_hole_options
 * @param o offset Grows or shrinks the final shapes.  Similar to `scale`, but in mm.
 */
module block_base_hole(hole_options, o=0) {
    assert(is_hole_options(hole_options));
    assert(is_num(o));

    // Destructure the options
    refined_hole = hole_options[1];
    magnet_hole = hole_options[2];
    screw_hole = hole_options[3];
    crush_ribs = hole_options[4];
    chamfer = hole_options[5];
    supportless = hole_options[6];

    screw_radius = SCREW_HOLE_RADIUS - (o/2);
    magnet_radius = MAGNET_HOLE_RADIUS - (o/2);
    magnet_inner_radius = MAGNET_HOLE_CRUSH_RIB_INNER_RADIUS - (o/2);
    screw_depth = BASE_HEIGHT - o;
    // If using supportless / printable mode, need to add additional layers, so they can be removed later.
    supportless_additional_layers = screw_hole ? 2 : 3;
    magnet_depth = MAGNET_HOLE_DEPTH - o +
        (supportless ? supportless_additional_layers*LAYER_HEIGHT : 0);

    union() {
        if(refined_hole) {
            refined_hole();
        }

        if(magnet_hole) {
            difference() {
                if(crush_ribs) {
                    ribbed_cylinder(magnet_radius, magnet_inner_radius, magnet_depth, MAGNET_HOLE_CRUSH_RIB_COUNT);
                } else {
                    cylinder(h = magnet_depth, r=magnet_radius);
                }

                if(supportless) {
                    make_hole_printable(
                    screw_hole ? screw_radius : 1, magnet_radius, magnet_depth, supportless_additional_layers);
                }
            }

            if(chamfer) {
                 cone(magnet_radius + CHAMFER_ADDITIONAL_RADIUS, CHAMFER_ANGLE, MAGNET_HOLE_DEPTH - o);
            }
        }
        if(screw_hole) {
            screw_hole(screw_radius, screw_depth, supportless,
                chamfer ? CHAMFER_ADDITIONAL_RADIUS : 0, CHAMFER_ANGLE);
        }
    }
}

// ==== Grid system functions ====

_is_valid_perimeter = function(element_dimensions, perimeter)
    assert(is_list(element_dimensions))
    let(rank=len(element_dimensions))
    is_undef(perimeter) || (
    is_list(perimeter)
    && len(perimeter) == 2 * rank
    && min([for(i=[0:rank-1])
        perimeter[i] + perimeter[i+rank] < element_dimensions[i]
        || (element_dimensions[i] ==0
            && perimeter[i] + perimeter[i+rank] == 0
        ) ? 1 : 0]) != 0
    );

function new_grid(
    num_elements,
    element_dimensions,
    center=false,
    perimeter=undef
    ) =
    assert(is_list(num_elements)
        && len(num_elements) >= 2
        && min(num_elements) >= 0)
    assert(is_list(element_dimensions)
        && len(element_dimensions) == len(num_elements)
        && min(element_dimensions) >= 0)
    assert(is_bool(center))
    assert(_is_valid_perimeter(element_dimensions, perimeter),
    str("perimeter must have ", len(element_dimensions) * 2," items, and must be smaller than an element."))
    [
        "grid_struct",
        num_elements,
        element_dimensions,
        center,
        !is_undef(perimeter) ? perimeter
            : [for(i=[0:2*len(element_dimensions)-1]) 0]
    ];

function is_grid(grid) =
    is_list(grid) && len(grid) == 5
    && grid[0] == "grid_struct";

module pattern_grid(num_elements, element_dimensions, center=false, center_elements=false) {
    grid = new_grid(num_elements, element_dimensions, center);
    grid_foreach(grid, center_elements) {
        children();
    }
}

module grid_foreach(grid, center_elements=false) {
    assert(is_grid(grid), "Not a grid.");
    num_elements = grid[1];

    count = grid_get_element_count(grid);
    rank = len(num_elements);

    for(sequence_number = [0:count-1]) {
        //Goes x -> y -> z
        index = [
            for(d=0,i=sequence_number;
                d<rank;
                i=floor(i/num_elements[d]), d=d+1
            )
            i % num_elements[d]
        ];

        grid_translate(grid, index, center_elements)
        children();
    }
}

function grid_get_element_count(grid) =
    assert(is_grid(grid), "Not a grid.")
    let(num_elements = grid[1])
    let(rank=len(num_elements))
    [for(i=0,a=1;i<rank;a=a*num_elements[i],i=i+1)
        a*num_elements[i]
    ][rank-1];

module grid_translate(grid, index, center=false) {
    element = grid_get_element(grid, index, center);
    $_grid_element = element;

    index_real = grid_element_get_index(element);
    partial_index = index - index_real;
    element_dimensions = grid_get_element_dimensions(grid);
    offset = [for(i=[0:len(index)-1])
        partial_index[i] * element_dimensions[i]
    ];

    translate(grid_element_get_position(element) + offset)
    children();
}

function grid_get_element_dimensions(grid) =
    assert(is_grid(grid), "Not a grid.")
    let(element_dimensions = grid[2])
    element_dimensions;

function grid_get_element(grid, index, center=false) =
    assert(is_grid(grid), "Not a grid.")
    let(num_elements = grid[1])

    assert(is_list(index) && len(index) == len(num_elements),
        str("index must be a list with ", len(num_elements), " items."))
    assert(min(index) >= 0, "index may not contain negative values.")
    assert(min([
            for(d=[0:len(index)-1])
            index[d] < num_elements[d] ? 1 : 0
        ]) == 1,
        str("index must be below ", num_elements))
    assert(is_bool(center))
    let(index_real = [for(i=index) floor(i)])
    [
        "grid_element_struct",
        grid,
        index_real,
        center // Return position as center of the element or not.
    ];

// Grid element accessors (minimal set needed)
function grid_element_get_index(element) =
    assert(is_grid_element(element), "Not a grid element.")
    let(grid=element[1])
    let(index=element[2])
    let(centered=element[3])
    index;

function is_grid_element(element) =
    is_list(element)
    && element[0] == "grid_element_struct"
    && len(element) == 4;

function grid_element_get_position(element) =
    assert(is_grid_element(element), "Not a grid element.")
    let(grid=element[1])
    let(index=element[2])
    let(centered=element[3])
    let(raw_element_dimensions = grid_get_element_dimensions(grid))
    let(raw_element_offset = [
        index.x * raw_element_dimensions.x,
        index.y * raw_element_dimensions.y,
        len(index) >= 3 ? index.z * raw_element_dimensions.z : 0
    ])
    raw_element_offset;

// ==== END: Baseplate modules and hole modules ====

hole_options = bundle_hole_options(refined_hole=false, magnet_hole=enable_magnet, screw_hole=false, crush_ribs=crush_ribs, chamfer=chamfer_holes, supportless=false);

// ===== IMPLEMENTATION ===== //

//color("tomato")
gridfinityBaseplate([gridx, gridy], l_grid, [distancex, distancey], style_plate, hole_options, style_hole, [fitx, fity]);

// ===== CONSTRUCTION ===== //

/**
 * @brief Create a baseplate.
 * @param grid_size_bases Number of Gridfinity bases.
 *        2d Vector. [x, y].
 *        Set to [0, 0] to auto calculate using min_size_mm.
 * @param length X,Y size of a single Gridfinity base.
 * @param min_size_mm Minimum size of the baseplate. [x, y]
 *                    Extra space is filled with solid material.
 *                    Enables "Fit to Drawer."
 * @param sp Baseplate Style
 * @param hole_options
 * @param sh Style of screw hole allowing the baseplate to be mounted to something.
 * @param fit_offset Determines where padding is added.
 */
module gridfinityBaseplate(grid_size_bases, length, min_size_mm, sp, hole_options, sh, fit_offset = [0, 0]) {

    assert(is_list(grid_size_bases) && len(grid_size_bases) == 2,
        "grid_size_bases must be a 2d list");
    assert(is_list(min_size_mm) && len(min_size_mm) == 2,
        "min_size_mm must be a 2d list");
    assert(is_list(fit_offset) && len(fit_offset) == 2,
        "fit_offset must be a 2d list");
    assert(grid_size_bases.x > 0 || min_size_mm.x > 0,
        "Must have positive x grid amount!");
    assert(grid_size_bases.y > 0 || min_size_mm.y > 0,
        "Must have positive y grid amount!");

    additional_height = calculate_offset(sp, hole_options[1], sh);

    // Final height of the baseplate. In mm.
    //baseplate_height_mm = additional_height + BASEPLATE_HEIGHT;
    baseplate_height_mm = BASEPLATE_HEIGHT;

    // Final size in number of bases
    grid_size = [for (i = [0:1])
        grid_size_bases[i] == 0 ? floor(min_size_mm[i]/length) : grid_size_bases[i]];

    // Final size of the base before padding. In mm.
    grid_size_mm = concat(grid_size * length, [baseplate_height_mm]);

    // Final size, including padding. In mm.
    size_mm = [
        max(grid_size_mm.x, min_size_mm.x),
        max(grid_size_mm.y, min_size_mm.y),
        baseplate_height_mm
    ];

    // Amount of padding needed to fit to a specific drawer size. In mm.
    padding_mm = size_mm - grid_size_mm;

    is_padding_needed = padding_mm != [0, 0, 0];

    //Convert the fit offset to percent of how much will be added to the positive axes.
    // -1 : 1 -> 0 : 1
    fit_percent_positive = [for (i = [0:1]) (fit_offset[i] + 1) / 2];

    padding_start_point = -grid_size_mm/2 -
        [
            padding_mm.x * (1 - fit_percent_positive.x),
            padding_mm.y * (1 - fit_percent_positive.y),
            -grid_size_mm.z/2
        ];

    corner_points = [
        padding_start_point + [size_mm.x, size_mm.y, 0],
        padding_start_point + [0, size_mm.y, 0],
        padding_start_point,
        padding_start_point + [size_mm.x, 0, 0],
    ];

    echo(str("Number of Grids per axes (X, Y)]: ", grid_size));
    echo(str("Final size (in mm): ", size_mm));
    if (is_padding_needed) {
        echo(str("Padding +X (in mm): ", padding_mm.x * fit_percent_positive.x));
        echo(str("Padding -X (in mm): ", padding_mm.x * (1 - fit_percent_positive.x)));
        echo(str("Padding +Y (in mm): ", padding_mm.y * fit_percent_positive.y));
        echo(str("Padding -Y (in mm): ", padding_mm.y * (1 - fit_percent_positive.y)));
    }

    screw_together = sp == 3 || sp == 4;
    minimal = sp == 0 || sp == 4;

    difference() {
        union() {
            // Baseplate itself
            
                



                translate(padding_start_point)
                //echo size mm aaron3
                //cube([42,42,5]);
                // union(){
                //     cube([42,42,5], center = false);
                //     cube([44,42,5], center = false);
                // }
                // Replicated Single Baseplate piece
                pattern_grid(grid_size, [length, length], true, true) {
                    if (minimal) {
                        translate([0, 0, -TOLLERANCE/2])
                        baseplate_cutter([length, length], baseplate_height_mm+TOLLERANCE);
                    } 
                }
            
        }

        // Round the outside corners (Including Padding)
        // for(i = [0:len(corner_points) - 1]) {
        //         point = corner_points[i];
        //         translate([
        //         point.x + (BASEPLATE_OUTER_RADIUS * -sign(point.x)),
        //         point.y + (BASEPLATE_OUTER_RADIUS * -sign(point.y)),
        //         0
        //     ])
        //     rotate([0, 0, i*90])
        //     square_baseplate_corner(additional_height, true);
        // }

        if (screw_together) {
            translate([0, 0, additional_height/2])
            cutter_screw_together(grid_size.x, grid_size.y, length);
        }
    }
}

function calculate_offset(style_plate, enable_magnet, style_hole) =
    assert(style_plate >=0 && style_plate <=4)
    let (screw_together = style_plate == 3 || style_plate == 4)
    screw_together ? 6.75 :
    style_plate==0 ? 0 :
    style_plate==1 ? bp_h_bot :
    calculate_offset_skeletonized(enable_magnet, style_hole);

function calculate_offset_skeletonized(enable_magnet, style_hole) =
    h_skel + (enable_magnet ? MAGNET_HOLE_DEPTH : 0) +
    (
        style_hole==0 ? d_screw :
        style_hole==1 ? BASEPLATE_SCREW_COUNTERSINK_ADDITIONAL_RADIUS : // Only works because countersink is at 45 degree angle!
        BASEPLATE_SCREW_COUNTERBORE_HEIGHT
    );

module cutter_weight() {
    union() {
        linear_extrude(bp_cut_depth*2,center=true)
        square(bp_cut_size, center=true);
        pattern_circular(4)
        translate([0,10,0])
        linear_extrude(bp_rcut_depth*2,center=true)
        union() {
            square([bp_rcut_width, bp_rcut_length], center=true);
            translate([0,bp_rcut_length/2,0])
            circle(d=bp_rcut_width);
        }
    }
}
module hole_pattern(){
    pattern_circular(4)
    translate([l_grid/2-d_hole_from_side, l_grid/2-d_hole_from_side, 0]) {
        render();
        children();
    }
}

module cutter_countersink(){
    screw_hole(SCREW_HOLE_RADIUS + TOLLERANCE, 2*BASE_PROFILE_HEIGHT,
        false, BASEPLATE_SCREW_COUNTERSINK_ADDITIONAL_RADIUS);
}

module cutter_counterbore(){
    screw_radius = SCREW_HOLE_RADIUS + TOLLERANCE;
    counterbore_height = BASEPLATE_SCREW_COUNTERBORE_HEIGHT + 2*LAYER_HEIGHT;
    union(){
        cylinder(h=2*BASE_PROFILE_HEIGHT, r=screw_radius);
        difference() {
            cylinder(h = counterbore_height, r=BASEPLATE_SCREW_COUNTERBORE_RADIUS);
            make_hole_printable(screw_radius, BASEPLATE_SCREW_COUNTERBORE_RADIUS, counterbore_height);
        }
    }
}

/**
 * @brief Added or removed from the baseplate to square off or round the corners.
 * @param height Baseplate's height, excluding lip and clearance height.
 * @param subtract If the corner should be scaled to allow subtraction.
 */
module square_baseplate_corner(height=0, subtract=false) {
    assert(height >= 0);
    assert(is_bool(subtract));

    subtract_ammount = subtract ? TOLLERANCE : 0;

    translate([0, 0, -subtract_ammount])
    linear_extrude(height + BASEPLATE_HEIGHT + (2 * subtract_ammount))
    difference() {
        square(BASEPLATE_OUTER_RADIUS + subtract_ammount , center=false);
        // TOLLERANCE needed to prevent a gap
        circle(r=BASEPLATE_OUTER_RADIUS - TOLLERANCE);
    }
}

/**
 * @brief 2d Cutter to skeletonize the baseplate.
 * @param size Width/Length of a single baseplate.  Only set if deviating from the standard!
 * @example difference(){
 *              cube(large_number);
 *              linear_extrude(large_number+TOLLERANCE)
 *              profile_skeleton();
 *          }
 */
module profile_skeleton(size=l_grid) {
    l = baseplate_inner_size([size, size]).x;

    offset(r_skel)
    difference() {
        square(l-2*r_skel, center = true);

        hole_pattern()
        offset(MAGNET_HOLE_RADIUS+r_skel+2)
        square([l,l]);
    }
}

module cutter_screw_together(gx, gy, size = l_grid) {

    screw(gx, gy);
    rotate([0,0,90])
    screw(gy, gx);

    module screw(a, b) {
        copy_mirror([1,0,0])
        translate([a*size/2, 0, 0])
        pattern_grid([1, b], [1, size], true, true)
        pattern_grid([1, n_screws], [1, d_screw_head + screw_spacing], true, true)
        rotate([0,90,0])
        cylinder(h=size/2, d=d_screw, center = true);
    }
}
